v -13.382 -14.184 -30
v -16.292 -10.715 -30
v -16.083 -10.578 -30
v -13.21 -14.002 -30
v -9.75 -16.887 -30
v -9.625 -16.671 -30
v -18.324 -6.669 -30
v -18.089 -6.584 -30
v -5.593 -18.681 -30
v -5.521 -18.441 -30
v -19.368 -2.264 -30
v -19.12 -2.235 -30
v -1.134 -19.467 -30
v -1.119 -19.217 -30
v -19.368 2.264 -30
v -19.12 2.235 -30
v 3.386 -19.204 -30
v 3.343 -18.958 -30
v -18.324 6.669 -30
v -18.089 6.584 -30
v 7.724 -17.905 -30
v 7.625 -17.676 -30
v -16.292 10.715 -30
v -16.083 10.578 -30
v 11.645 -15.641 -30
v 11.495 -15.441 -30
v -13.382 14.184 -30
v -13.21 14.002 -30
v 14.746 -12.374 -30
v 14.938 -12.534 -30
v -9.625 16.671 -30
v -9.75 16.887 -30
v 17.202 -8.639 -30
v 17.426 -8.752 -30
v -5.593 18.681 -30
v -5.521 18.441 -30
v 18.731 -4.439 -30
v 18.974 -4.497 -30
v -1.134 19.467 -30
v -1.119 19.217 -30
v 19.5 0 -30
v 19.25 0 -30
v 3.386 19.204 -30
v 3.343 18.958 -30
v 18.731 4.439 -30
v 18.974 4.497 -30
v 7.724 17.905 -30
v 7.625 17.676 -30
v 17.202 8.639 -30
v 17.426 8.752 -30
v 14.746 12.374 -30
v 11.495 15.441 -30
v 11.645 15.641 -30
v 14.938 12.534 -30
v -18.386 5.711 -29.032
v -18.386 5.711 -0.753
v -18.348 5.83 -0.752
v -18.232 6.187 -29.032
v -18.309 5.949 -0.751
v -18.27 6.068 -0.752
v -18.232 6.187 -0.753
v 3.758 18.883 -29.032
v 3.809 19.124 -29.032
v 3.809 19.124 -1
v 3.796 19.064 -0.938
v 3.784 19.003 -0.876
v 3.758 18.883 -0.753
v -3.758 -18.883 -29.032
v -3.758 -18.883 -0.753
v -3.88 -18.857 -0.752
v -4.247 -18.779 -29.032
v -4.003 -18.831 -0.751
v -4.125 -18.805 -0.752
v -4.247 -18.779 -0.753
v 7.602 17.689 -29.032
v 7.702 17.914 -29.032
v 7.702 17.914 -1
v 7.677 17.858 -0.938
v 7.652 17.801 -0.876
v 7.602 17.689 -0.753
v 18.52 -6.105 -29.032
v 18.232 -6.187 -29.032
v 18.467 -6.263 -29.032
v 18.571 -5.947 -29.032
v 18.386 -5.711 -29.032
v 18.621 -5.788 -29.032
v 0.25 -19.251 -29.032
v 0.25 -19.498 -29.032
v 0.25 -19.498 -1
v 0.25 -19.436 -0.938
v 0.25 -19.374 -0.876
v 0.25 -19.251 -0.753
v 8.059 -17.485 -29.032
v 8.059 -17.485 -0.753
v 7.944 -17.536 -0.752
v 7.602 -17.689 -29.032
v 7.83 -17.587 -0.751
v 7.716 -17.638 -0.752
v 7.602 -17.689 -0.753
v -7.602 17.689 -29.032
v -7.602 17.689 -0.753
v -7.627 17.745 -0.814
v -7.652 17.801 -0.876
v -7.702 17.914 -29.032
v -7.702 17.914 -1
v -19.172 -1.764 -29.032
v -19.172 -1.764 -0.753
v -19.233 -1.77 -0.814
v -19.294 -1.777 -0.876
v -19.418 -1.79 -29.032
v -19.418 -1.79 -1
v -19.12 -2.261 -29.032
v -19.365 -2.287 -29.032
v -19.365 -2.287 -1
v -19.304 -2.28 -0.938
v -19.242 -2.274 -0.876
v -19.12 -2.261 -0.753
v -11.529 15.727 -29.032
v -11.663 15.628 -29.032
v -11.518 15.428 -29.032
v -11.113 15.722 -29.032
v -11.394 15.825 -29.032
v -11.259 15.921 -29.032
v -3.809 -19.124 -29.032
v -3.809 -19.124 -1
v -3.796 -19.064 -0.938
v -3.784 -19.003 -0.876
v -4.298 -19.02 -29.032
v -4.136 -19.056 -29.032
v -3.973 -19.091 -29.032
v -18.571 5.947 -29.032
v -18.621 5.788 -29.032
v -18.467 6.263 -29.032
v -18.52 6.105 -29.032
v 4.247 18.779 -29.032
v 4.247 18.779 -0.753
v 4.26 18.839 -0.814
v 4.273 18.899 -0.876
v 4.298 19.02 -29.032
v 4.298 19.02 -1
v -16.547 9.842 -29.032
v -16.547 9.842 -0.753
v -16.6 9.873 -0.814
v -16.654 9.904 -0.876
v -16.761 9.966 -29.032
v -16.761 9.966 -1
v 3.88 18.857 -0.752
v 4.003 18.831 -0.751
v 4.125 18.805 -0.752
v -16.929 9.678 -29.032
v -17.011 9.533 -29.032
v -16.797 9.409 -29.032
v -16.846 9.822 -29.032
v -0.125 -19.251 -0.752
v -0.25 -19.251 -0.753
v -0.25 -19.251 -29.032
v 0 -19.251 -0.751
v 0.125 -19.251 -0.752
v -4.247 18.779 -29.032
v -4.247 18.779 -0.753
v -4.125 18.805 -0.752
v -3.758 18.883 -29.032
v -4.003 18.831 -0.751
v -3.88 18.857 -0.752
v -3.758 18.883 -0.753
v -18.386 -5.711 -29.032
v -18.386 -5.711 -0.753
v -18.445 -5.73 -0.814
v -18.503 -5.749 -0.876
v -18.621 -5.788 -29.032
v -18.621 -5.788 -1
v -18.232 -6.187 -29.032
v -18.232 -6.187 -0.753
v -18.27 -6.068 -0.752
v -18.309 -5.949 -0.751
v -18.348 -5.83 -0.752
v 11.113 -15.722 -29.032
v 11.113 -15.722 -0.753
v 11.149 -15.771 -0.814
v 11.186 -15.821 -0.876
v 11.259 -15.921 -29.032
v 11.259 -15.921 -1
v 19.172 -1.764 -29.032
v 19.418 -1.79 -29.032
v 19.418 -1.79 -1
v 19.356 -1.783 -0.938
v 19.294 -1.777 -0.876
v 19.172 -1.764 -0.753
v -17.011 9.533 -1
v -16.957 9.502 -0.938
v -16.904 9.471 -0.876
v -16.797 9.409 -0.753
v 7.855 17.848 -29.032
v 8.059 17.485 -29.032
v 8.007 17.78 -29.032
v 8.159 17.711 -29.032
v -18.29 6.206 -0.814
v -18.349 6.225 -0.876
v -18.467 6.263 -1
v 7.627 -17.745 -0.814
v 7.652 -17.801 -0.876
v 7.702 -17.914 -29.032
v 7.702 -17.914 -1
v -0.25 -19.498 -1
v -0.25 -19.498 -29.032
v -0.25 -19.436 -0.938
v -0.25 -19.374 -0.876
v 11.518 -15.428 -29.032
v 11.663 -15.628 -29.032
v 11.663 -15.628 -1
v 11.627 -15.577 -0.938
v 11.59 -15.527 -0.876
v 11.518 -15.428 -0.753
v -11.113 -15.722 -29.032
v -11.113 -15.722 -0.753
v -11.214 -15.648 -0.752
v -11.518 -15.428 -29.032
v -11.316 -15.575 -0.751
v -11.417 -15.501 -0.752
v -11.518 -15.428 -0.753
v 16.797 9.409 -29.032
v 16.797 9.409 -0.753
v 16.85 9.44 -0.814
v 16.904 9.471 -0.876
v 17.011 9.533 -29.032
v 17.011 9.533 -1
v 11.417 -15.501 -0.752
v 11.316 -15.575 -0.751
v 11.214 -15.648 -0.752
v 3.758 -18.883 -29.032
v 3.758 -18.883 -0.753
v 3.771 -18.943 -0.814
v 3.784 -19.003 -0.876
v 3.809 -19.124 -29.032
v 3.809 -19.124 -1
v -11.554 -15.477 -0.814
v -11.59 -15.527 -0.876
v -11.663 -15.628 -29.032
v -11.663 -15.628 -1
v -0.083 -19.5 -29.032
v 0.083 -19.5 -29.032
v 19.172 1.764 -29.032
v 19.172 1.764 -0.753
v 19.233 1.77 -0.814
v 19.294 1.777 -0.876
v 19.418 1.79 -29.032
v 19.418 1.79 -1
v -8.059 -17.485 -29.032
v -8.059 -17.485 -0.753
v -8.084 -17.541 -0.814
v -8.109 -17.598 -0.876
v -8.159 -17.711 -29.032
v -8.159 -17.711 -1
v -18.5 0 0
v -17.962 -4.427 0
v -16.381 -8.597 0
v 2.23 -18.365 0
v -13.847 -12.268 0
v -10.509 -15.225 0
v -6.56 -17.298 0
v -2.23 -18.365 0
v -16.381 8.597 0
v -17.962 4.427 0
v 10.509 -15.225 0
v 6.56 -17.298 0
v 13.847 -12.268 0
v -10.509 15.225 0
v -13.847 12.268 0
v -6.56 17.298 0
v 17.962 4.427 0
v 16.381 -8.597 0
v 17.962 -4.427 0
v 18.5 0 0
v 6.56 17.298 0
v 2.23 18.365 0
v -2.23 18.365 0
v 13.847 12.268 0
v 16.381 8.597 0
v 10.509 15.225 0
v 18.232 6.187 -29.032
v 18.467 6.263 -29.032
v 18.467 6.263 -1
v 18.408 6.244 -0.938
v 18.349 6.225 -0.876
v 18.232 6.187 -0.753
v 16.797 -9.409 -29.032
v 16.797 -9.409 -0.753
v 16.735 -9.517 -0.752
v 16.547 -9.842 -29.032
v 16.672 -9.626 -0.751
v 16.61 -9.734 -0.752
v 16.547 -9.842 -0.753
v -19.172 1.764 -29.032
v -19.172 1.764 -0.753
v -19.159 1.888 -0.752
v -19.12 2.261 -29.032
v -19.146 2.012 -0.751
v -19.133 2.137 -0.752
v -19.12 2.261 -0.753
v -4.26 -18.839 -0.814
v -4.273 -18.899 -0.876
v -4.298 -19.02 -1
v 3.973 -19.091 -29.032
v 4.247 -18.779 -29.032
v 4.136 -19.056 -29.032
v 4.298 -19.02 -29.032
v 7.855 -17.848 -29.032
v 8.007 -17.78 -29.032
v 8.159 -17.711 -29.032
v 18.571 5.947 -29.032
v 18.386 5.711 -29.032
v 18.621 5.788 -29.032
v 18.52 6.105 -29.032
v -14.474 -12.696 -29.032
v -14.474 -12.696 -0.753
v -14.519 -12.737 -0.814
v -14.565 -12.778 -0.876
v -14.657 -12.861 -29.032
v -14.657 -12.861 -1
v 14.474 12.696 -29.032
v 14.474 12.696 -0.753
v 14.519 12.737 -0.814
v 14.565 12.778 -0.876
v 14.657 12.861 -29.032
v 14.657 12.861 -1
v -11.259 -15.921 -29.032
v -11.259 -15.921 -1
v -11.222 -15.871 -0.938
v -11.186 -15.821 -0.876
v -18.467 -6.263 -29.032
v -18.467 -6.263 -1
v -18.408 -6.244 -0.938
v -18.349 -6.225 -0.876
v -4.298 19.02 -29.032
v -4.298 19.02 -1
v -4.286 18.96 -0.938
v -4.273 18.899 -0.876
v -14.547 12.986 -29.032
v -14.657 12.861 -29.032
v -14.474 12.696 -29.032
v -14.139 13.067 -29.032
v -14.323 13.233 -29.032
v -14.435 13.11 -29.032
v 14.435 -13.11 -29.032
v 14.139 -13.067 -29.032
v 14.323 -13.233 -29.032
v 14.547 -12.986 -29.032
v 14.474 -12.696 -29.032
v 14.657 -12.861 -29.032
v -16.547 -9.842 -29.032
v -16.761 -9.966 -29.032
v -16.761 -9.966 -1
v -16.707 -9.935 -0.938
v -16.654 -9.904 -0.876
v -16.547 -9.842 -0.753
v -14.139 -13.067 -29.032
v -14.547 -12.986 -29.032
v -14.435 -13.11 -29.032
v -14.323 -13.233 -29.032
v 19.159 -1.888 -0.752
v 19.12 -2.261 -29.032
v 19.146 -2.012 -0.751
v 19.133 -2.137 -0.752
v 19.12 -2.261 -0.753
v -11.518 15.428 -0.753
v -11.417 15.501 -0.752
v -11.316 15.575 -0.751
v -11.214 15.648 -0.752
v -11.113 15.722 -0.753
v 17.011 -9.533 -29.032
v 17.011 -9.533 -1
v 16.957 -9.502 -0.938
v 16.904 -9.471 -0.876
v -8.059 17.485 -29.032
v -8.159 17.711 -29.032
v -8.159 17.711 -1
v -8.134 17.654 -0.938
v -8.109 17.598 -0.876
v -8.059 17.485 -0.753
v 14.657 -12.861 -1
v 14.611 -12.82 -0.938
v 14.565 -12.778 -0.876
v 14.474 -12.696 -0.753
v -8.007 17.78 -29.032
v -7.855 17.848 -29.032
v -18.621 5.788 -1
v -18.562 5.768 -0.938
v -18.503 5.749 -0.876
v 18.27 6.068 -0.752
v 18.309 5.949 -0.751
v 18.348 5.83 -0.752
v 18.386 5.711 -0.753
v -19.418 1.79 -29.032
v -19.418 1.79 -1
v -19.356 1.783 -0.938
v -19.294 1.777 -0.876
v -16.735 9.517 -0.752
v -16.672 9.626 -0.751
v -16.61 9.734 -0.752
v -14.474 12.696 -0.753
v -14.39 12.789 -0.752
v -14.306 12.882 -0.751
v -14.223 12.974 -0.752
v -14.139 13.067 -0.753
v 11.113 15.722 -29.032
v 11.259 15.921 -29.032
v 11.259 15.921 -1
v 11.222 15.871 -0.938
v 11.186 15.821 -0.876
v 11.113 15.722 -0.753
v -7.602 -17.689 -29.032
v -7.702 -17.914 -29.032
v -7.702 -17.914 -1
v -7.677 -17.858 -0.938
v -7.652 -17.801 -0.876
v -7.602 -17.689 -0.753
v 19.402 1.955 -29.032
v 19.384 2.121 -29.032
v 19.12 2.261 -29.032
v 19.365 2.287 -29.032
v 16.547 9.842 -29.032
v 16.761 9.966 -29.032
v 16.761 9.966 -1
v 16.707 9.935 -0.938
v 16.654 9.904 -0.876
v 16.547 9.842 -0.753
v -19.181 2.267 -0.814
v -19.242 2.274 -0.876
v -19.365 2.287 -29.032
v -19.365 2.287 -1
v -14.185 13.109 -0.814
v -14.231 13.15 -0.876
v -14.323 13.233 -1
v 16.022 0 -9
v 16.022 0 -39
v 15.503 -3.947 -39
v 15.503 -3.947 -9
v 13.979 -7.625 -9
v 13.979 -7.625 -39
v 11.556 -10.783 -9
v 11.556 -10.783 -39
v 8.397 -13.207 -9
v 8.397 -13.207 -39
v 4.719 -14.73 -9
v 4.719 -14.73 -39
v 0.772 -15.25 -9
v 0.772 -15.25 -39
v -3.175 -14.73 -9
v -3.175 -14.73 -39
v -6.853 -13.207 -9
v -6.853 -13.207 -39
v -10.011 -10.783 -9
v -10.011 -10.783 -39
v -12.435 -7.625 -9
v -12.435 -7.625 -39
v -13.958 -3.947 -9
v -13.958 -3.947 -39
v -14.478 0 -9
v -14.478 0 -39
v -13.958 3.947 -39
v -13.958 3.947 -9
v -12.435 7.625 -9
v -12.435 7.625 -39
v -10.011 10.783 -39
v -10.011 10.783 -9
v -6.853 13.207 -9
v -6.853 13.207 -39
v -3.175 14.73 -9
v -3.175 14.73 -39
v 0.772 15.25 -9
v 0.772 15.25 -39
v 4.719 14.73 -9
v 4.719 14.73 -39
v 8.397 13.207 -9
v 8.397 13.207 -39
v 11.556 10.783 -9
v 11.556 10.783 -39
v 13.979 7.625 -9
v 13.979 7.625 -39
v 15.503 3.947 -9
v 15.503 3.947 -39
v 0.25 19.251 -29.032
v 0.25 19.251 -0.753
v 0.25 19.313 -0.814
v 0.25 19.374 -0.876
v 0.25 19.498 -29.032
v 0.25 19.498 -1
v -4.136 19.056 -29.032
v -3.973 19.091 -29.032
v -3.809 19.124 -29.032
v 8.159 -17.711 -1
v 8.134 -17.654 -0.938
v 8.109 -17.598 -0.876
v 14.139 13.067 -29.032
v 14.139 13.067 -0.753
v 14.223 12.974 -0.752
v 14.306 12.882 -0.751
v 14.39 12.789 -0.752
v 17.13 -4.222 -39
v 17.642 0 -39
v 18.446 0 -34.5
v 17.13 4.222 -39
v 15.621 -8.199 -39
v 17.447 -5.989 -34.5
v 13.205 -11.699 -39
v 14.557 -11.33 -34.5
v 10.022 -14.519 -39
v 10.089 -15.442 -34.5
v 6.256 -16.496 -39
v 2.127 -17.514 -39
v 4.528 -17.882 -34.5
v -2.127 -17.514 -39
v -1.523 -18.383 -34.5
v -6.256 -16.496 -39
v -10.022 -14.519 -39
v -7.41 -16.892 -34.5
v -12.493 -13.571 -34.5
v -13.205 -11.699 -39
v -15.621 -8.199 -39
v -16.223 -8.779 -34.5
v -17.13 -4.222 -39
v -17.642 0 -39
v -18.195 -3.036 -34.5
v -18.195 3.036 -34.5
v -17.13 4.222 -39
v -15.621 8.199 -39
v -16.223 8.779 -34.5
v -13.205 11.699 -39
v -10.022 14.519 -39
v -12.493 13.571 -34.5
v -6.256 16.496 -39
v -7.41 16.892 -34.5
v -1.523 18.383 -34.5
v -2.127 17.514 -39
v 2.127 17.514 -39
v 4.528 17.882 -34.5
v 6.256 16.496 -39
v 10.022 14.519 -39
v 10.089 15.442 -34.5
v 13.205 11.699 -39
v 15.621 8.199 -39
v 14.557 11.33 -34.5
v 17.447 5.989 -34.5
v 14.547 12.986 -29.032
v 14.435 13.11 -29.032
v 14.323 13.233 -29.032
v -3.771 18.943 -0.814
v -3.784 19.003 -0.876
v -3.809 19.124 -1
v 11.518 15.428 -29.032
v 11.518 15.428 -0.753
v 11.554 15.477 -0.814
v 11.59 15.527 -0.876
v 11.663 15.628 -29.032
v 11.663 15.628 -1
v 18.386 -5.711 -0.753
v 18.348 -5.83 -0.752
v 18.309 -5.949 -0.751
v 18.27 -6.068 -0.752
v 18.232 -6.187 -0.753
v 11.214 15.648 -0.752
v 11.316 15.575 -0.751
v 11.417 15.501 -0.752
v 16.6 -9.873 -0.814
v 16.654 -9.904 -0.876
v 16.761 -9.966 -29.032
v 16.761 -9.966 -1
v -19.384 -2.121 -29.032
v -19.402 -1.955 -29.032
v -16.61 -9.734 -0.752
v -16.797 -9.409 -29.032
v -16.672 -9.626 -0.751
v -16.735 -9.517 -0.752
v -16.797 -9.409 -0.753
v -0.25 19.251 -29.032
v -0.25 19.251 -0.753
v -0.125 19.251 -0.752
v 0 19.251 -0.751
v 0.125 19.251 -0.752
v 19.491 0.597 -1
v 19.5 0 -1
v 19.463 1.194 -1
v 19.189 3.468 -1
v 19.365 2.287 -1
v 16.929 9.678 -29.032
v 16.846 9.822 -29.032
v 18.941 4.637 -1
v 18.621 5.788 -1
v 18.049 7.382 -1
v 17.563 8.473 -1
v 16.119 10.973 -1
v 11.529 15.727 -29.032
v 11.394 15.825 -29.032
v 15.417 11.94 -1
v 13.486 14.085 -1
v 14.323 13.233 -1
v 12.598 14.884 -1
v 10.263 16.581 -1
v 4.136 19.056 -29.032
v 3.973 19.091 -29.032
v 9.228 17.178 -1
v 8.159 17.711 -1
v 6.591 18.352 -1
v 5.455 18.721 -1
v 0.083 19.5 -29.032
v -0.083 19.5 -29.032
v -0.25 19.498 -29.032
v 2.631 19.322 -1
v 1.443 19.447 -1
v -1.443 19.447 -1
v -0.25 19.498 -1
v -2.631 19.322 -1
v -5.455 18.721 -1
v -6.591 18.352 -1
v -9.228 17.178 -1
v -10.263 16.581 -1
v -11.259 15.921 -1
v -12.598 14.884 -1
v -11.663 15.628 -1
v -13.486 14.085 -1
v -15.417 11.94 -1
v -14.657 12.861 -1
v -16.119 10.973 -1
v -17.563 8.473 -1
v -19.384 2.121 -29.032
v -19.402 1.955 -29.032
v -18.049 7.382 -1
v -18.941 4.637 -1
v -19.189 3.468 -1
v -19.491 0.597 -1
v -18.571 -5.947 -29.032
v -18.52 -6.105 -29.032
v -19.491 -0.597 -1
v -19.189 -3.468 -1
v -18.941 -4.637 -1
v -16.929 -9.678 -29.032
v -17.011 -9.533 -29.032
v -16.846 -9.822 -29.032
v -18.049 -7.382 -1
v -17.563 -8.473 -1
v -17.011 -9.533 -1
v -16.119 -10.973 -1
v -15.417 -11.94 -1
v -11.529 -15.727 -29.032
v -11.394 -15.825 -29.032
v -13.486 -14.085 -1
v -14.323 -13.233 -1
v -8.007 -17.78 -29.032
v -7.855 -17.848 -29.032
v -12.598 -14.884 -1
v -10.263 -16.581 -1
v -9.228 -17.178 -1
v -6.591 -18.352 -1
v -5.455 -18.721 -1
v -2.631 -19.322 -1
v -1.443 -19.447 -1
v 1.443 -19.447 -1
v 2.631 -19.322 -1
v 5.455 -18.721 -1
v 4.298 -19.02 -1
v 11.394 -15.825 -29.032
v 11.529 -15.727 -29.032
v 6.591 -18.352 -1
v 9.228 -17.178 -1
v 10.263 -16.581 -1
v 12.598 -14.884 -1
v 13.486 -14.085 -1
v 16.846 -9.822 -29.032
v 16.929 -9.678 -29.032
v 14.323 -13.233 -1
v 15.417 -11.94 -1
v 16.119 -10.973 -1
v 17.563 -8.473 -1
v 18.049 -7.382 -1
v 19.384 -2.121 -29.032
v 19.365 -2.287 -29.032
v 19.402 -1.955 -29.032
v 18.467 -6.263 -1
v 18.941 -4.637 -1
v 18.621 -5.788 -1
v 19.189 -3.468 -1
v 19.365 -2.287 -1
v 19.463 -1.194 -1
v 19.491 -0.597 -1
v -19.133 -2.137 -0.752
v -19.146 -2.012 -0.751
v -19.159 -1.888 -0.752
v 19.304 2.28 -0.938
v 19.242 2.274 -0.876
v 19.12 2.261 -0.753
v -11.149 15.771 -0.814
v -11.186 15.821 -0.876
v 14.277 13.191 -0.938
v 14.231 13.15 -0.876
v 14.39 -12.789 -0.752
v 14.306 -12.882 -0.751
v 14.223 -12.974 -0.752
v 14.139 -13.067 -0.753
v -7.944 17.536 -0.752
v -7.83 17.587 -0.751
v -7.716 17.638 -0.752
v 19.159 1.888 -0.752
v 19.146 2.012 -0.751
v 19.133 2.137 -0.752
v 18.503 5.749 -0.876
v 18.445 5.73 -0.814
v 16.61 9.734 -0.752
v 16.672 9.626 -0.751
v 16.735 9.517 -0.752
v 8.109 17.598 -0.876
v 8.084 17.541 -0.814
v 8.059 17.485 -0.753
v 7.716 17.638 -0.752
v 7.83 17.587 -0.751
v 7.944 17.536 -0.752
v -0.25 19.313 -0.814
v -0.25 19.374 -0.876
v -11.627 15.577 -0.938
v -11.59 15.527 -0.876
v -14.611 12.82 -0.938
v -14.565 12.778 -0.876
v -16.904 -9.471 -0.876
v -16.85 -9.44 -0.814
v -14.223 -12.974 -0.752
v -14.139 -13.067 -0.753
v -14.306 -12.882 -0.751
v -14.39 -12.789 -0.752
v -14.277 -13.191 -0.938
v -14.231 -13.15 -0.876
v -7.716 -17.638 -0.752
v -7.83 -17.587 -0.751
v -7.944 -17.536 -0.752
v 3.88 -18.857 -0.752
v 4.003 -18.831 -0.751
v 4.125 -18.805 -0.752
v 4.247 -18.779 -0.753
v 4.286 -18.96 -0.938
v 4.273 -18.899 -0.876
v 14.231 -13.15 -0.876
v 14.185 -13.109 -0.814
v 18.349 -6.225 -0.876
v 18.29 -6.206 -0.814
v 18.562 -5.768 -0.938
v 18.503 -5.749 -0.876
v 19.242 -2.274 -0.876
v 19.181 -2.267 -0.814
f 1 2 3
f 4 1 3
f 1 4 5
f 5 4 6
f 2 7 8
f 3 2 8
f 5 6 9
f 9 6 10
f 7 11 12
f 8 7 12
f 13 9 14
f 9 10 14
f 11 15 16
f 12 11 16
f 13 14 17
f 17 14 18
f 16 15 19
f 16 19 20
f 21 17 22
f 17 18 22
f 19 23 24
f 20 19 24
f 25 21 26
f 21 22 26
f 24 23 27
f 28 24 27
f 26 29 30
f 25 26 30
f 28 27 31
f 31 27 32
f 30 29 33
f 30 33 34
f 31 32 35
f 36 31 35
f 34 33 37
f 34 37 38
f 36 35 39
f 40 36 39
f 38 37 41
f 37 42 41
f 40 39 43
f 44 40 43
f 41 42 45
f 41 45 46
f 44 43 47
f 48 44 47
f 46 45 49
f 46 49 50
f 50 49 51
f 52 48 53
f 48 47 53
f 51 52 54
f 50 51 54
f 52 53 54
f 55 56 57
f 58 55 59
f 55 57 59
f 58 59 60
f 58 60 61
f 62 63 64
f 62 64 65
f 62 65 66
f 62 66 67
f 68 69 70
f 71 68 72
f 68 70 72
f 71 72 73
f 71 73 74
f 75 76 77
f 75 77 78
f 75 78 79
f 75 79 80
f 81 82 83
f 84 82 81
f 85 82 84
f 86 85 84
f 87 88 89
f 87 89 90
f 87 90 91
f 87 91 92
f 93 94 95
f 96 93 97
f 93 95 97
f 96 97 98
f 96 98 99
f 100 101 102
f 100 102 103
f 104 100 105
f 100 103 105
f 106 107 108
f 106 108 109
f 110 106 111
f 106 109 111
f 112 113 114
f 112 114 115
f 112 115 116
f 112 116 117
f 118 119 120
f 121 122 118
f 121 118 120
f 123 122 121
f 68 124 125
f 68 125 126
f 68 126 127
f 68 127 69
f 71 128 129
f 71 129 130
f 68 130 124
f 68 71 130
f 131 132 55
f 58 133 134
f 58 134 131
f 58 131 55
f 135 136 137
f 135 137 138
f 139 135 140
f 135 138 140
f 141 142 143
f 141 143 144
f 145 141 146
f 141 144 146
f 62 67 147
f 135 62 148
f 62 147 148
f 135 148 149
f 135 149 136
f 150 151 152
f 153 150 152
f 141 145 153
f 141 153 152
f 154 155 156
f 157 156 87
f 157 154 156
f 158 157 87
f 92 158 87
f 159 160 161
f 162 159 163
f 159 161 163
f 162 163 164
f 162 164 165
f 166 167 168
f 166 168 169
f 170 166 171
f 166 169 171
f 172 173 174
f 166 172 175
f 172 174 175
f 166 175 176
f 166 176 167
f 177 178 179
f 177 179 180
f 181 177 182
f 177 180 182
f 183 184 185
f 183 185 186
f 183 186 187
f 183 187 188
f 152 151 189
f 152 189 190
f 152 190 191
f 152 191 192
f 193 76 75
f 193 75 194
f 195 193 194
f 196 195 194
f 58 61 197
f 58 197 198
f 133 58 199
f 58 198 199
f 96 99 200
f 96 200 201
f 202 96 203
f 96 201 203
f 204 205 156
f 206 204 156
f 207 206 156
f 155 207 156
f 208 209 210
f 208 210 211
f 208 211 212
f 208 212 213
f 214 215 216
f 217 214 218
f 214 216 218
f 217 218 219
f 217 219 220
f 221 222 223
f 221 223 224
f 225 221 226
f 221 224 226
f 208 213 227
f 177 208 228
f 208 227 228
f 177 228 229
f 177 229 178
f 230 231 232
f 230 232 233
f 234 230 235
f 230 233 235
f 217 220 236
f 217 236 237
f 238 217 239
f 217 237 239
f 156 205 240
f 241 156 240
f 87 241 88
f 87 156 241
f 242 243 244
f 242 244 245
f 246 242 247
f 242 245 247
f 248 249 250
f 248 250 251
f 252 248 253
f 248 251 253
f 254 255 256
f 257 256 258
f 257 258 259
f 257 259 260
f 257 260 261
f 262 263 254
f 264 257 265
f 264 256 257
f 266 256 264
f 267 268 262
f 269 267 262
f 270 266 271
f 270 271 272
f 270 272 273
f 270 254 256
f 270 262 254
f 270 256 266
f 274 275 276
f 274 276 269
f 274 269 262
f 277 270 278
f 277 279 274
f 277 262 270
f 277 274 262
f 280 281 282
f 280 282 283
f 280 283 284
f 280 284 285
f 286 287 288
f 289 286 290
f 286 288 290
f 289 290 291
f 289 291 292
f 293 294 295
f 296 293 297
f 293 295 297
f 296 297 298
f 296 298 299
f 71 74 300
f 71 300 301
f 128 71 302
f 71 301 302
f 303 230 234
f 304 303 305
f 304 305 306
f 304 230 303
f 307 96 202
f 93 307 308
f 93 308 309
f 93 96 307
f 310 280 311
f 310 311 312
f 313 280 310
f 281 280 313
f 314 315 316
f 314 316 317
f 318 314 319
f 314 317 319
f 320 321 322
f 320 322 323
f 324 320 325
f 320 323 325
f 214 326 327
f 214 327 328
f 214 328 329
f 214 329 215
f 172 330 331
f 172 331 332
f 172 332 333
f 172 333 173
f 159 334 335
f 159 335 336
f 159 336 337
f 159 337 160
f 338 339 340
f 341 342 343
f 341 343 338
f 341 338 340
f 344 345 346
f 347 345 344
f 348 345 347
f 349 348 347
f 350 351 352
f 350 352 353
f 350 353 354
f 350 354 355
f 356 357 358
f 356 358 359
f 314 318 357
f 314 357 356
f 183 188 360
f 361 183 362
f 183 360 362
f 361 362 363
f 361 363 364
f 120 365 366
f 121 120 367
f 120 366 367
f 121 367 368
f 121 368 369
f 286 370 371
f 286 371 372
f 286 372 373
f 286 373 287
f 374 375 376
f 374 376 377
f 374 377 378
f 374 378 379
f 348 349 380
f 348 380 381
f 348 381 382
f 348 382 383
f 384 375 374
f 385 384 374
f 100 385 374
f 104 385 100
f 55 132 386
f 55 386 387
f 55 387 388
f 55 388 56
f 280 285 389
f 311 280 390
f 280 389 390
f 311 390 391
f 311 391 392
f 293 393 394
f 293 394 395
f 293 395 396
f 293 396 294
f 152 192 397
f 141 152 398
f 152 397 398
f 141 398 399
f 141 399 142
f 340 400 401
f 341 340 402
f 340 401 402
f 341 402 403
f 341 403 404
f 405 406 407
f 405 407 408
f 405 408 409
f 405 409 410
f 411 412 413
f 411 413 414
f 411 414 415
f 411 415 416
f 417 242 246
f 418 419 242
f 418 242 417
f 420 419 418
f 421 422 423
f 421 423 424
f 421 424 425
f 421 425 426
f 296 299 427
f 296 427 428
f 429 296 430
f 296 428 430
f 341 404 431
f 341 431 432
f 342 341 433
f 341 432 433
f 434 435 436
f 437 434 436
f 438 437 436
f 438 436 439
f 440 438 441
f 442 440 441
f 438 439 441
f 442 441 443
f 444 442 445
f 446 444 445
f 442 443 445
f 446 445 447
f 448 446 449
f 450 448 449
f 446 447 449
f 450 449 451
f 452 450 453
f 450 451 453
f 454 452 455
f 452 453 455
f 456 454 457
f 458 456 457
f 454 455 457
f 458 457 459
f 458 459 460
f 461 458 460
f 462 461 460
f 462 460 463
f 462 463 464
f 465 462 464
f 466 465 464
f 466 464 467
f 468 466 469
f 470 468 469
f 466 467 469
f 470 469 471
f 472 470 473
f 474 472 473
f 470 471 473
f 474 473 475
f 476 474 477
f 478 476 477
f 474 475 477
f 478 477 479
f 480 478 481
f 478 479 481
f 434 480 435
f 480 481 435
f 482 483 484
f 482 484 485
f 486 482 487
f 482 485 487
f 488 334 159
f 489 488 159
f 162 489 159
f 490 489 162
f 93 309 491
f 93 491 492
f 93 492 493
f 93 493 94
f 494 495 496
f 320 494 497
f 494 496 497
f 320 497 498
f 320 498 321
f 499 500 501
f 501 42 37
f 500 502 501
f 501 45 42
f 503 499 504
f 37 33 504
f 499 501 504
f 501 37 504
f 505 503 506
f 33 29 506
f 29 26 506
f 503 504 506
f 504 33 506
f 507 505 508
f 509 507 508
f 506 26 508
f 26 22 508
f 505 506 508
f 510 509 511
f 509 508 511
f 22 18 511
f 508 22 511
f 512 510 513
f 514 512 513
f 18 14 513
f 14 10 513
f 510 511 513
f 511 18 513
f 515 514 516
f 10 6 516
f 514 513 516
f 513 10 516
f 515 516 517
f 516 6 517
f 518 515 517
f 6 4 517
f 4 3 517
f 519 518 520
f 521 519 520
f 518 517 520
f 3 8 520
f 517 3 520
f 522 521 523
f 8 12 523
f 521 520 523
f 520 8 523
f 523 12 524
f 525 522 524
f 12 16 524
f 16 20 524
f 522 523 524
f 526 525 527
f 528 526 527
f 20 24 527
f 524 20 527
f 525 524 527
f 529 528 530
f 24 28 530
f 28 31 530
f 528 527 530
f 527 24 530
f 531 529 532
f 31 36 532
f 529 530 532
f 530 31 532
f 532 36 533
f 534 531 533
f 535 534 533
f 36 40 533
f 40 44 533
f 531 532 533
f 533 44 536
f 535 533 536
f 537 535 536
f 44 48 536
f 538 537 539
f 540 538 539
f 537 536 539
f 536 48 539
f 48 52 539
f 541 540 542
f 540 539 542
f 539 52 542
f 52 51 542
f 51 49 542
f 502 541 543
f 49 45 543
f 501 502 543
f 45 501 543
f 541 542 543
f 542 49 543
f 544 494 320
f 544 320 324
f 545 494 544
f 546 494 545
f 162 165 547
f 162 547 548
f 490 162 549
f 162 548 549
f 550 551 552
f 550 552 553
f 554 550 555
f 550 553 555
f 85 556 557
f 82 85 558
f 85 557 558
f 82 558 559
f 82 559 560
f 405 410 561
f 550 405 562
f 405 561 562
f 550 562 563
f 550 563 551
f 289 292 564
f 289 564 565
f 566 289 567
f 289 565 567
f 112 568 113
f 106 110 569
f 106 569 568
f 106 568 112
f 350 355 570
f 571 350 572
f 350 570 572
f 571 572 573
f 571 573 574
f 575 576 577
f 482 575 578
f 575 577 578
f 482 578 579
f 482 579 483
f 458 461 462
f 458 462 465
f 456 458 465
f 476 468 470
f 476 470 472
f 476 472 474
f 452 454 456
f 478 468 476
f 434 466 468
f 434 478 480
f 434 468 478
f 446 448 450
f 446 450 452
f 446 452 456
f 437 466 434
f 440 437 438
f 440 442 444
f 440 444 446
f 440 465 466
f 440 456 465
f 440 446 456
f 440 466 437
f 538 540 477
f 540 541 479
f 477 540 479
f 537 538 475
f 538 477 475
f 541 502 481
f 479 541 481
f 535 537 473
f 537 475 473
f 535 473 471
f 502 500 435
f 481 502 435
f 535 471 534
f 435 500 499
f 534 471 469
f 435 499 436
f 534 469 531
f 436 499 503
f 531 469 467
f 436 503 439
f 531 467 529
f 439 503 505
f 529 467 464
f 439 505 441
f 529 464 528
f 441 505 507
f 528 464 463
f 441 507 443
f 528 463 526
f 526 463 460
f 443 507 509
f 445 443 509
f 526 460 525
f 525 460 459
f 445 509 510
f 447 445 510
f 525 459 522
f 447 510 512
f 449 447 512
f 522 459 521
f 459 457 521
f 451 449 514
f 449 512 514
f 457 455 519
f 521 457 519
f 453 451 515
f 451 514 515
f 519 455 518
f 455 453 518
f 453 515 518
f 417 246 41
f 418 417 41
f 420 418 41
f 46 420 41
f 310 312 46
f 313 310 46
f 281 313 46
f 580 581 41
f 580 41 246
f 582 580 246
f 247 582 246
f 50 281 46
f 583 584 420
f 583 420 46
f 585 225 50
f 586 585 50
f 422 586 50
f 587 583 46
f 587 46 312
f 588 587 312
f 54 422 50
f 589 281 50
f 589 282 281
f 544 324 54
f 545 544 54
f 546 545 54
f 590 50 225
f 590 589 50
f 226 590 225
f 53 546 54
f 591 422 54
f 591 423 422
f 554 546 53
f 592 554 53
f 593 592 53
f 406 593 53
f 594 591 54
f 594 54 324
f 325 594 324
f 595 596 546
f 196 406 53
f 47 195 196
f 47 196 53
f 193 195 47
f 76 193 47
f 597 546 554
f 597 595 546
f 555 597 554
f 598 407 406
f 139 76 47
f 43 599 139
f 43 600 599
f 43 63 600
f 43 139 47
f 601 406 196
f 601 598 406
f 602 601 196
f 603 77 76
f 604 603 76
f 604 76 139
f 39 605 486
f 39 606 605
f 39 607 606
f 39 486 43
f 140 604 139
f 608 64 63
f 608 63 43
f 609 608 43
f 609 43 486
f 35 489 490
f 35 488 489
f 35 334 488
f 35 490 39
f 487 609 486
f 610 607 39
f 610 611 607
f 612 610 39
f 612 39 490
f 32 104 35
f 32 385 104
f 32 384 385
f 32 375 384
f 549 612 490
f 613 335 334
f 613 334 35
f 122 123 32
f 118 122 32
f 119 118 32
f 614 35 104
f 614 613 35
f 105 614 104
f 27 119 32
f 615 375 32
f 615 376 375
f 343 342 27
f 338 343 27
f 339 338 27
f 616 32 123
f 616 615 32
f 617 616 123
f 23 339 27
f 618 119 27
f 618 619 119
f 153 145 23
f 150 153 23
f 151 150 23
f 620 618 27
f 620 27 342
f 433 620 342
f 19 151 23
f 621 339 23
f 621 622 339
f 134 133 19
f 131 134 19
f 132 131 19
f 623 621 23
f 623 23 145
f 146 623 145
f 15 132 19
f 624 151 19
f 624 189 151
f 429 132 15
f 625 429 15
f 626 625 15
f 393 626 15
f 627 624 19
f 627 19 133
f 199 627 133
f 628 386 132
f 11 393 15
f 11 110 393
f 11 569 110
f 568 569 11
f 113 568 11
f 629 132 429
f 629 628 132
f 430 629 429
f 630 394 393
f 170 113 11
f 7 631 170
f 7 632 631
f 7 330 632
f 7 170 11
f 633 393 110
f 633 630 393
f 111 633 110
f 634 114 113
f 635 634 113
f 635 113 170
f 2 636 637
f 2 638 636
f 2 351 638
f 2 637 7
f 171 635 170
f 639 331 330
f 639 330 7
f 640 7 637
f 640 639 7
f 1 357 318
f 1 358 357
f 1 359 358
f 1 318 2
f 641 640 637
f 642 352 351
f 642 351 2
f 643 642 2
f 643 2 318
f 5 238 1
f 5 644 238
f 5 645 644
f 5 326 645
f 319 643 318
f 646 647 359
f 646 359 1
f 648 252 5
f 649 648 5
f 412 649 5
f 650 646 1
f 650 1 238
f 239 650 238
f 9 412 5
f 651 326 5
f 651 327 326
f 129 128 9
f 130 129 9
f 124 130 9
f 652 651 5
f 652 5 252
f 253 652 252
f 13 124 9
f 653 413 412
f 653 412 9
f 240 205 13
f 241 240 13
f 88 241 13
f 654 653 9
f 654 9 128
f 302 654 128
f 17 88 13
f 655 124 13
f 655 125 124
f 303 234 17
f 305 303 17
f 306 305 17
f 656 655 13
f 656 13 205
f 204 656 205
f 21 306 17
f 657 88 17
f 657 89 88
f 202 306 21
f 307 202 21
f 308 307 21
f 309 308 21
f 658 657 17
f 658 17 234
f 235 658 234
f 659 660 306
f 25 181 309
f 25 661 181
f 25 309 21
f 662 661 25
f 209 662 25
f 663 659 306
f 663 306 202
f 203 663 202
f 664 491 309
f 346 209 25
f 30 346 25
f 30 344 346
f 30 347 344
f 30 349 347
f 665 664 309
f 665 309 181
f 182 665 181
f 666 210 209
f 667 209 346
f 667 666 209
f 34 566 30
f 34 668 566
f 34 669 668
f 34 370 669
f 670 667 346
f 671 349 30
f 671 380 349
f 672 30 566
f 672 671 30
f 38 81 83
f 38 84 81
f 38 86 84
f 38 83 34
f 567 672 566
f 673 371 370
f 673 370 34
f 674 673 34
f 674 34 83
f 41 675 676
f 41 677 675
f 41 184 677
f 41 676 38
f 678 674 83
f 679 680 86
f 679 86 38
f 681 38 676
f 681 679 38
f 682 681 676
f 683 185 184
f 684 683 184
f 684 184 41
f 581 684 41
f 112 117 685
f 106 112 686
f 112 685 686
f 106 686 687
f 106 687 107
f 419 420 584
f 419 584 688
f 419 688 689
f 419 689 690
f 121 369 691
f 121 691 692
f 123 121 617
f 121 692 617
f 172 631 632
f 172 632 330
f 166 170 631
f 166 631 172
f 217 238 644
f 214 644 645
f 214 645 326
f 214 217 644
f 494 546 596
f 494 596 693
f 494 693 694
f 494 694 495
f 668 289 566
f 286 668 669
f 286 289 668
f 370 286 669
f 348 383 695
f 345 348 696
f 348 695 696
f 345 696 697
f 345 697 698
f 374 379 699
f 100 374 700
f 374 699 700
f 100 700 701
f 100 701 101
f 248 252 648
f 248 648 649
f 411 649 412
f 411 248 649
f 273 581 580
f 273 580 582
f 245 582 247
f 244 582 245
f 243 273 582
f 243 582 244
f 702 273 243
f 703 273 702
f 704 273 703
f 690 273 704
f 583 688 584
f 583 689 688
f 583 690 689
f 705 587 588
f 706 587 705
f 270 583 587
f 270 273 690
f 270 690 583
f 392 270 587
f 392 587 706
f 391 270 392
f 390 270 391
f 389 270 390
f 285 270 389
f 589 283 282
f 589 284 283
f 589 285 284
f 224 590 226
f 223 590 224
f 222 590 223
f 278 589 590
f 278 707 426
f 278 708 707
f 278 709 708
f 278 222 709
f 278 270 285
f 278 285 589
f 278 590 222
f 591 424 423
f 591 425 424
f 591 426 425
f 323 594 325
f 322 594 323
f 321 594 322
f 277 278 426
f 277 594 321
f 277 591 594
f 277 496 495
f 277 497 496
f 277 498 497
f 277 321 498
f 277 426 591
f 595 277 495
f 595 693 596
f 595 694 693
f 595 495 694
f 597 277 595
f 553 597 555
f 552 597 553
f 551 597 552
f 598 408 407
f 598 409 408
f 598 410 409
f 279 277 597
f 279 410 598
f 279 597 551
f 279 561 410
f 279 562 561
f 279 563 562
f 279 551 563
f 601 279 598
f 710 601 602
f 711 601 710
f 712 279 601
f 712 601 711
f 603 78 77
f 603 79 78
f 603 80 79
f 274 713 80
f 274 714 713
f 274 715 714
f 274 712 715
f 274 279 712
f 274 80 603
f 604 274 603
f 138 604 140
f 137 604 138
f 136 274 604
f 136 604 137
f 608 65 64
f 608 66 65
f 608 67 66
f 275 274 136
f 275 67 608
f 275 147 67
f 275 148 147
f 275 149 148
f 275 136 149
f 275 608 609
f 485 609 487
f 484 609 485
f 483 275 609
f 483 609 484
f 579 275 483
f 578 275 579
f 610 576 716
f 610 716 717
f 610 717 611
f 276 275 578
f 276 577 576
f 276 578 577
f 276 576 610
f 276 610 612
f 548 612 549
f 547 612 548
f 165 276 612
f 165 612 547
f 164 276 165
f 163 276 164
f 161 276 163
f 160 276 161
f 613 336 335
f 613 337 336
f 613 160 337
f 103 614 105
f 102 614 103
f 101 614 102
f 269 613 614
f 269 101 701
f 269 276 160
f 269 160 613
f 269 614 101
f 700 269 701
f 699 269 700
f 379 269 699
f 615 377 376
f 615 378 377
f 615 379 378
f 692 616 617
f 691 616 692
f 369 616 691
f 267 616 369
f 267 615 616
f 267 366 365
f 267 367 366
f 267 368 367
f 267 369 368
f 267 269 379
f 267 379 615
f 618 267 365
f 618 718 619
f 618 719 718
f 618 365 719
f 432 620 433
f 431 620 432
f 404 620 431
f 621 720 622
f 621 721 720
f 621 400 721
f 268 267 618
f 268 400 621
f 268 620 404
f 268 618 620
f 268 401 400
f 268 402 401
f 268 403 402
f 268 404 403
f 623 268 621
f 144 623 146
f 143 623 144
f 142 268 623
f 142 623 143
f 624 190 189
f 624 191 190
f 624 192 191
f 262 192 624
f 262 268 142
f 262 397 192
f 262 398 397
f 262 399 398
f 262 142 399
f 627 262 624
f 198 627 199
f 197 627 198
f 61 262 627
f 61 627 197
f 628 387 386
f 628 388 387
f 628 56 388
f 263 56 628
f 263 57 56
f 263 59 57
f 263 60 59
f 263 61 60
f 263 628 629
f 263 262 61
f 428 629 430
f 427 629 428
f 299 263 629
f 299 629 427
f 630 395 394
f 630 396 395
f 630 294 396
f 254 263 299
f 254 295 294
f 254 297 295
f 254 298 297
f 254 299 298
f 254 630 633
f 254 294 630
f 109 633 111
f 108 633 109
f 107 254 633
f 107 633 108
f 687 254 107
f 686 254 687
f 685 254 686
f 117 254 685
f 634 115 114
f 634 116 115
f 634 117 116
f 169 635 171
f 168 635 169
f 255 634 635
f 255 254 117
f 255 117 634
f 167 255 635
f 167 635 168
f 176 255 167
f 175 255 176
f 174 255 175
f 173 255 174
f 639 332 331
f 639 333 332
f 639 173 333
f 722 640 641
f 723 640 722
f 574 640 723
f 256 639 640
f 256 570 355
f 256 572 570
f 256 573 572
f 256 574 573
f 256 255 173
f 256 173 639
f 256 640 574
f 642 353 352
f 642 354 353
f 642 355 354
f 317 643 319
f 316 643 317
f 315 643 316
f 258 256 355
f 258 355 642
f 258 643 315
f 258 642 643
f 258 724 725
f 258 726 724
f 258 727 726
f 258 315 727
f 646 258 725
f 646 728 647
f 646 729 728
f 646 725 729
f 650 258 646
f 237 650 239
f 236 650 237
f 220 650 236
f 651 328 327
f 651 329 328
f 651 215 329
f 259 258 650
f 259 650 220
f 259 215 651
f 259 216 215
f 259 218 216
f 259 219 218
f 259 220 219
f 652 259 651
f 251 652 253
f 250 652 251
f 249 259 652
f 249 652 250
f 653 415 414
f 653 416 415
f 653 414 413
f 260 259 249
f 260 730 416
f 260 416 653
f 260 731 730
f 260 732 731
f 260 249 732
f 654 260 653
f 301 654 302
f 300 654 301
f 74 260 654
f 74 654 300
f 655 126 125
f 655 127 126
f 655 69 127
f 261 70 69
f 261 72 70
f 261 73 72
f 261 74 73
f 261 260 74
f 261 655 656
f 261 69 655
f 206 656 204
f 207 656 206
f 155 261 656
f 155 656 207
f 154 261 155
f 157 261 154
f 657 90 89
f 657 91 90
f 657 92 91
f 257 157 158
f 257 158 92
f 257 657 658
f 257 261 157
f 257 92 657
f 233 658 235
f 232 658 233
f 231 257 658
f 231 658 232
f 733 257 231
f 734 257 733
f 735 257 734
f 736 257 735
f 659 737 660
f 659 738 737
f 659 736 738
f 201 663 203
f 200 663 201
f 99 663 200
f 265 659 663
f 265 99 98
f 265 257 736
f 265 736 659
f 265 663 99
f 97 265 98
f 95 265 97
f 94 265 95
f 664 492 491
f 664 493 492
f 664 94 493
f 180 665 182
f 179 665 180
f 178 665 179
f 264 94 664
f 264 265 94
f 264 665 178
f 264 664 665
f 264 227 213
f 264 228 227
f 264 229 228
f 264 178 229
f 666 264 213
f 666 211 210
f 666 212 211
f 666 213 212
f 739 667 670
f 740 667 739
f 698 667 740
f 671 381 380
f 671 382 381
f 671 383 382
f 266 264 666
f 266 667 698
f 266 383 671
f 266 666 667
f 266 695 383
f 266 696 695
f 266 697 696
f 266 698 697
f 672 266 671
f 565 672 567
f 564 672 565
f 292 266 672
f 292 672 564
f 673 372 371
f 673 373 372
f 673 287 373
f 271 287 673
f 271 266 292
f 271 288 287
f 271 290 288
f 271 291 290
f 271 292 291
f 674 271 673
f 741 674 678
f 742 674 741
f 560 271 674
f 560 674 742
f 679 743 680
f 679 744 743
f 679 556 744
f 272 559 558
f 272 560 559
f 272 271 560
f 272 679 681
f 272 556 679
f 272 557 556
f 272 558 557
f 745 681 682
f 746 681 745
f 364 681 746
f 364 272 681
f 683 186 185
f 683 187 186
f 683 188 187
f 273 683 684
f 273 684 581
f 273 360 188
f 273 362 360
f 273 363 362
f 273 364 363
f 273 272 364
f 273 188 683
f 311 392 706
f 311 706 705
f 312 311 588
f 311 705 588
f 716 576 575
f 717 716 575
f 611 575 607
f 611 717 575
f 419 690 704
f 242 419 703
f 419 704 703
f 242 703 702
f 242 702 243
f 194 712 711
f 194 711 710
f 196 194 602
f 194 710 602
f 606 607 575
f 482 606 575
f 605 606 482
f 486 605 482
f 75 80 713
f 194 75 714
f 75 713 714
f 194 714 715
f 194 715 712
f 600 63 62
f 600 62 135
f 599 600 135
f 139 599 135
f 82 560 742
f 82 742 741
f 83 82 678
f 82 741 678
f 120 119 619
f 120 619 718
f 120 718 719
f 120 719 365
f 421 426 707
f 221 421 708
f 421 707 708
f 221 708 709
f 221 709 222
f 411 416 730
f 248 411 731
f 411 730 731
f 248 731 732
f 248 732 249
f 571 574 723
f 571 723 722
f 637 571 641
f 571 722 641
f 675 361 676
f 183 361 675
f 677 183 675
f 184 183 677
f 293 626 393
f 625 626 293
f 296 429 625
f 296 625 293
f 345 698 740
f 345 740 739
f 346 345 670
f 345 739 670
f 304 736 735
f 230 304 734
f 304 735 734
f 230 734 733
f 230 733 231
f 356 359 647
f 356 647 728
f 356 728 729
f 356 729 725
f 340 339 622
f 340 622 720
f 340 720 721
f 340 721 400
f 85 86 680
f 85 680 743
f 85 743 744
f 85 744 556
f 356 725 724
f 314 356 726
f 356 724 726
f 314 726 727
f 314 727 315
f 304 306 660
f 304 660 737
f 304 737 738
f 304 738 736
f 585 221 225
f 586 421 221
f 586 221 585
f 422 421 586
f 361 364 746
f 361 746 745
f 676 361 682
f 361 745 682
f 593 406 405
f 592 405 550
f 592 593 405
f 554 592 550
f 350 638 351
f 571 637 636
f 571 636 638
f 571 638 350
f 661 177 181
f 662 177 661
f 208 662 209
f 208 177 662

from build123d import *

# Parameters (mm, degrees)
F0_R     = 19.5
F1_DEPTH = 30
F2_SIZE  = 1
F5_R     = 15.25
F6_DEPTH = 30
F7_W     = 0.5
F7_H     = 0.5
F8_DEPTH = 29.032


with BuildPart() as f1:
    # F0 (on Top) → F1 (new body)
    with BuildSketch(Plane.XY):
        Circle(F0_R)
    extrude(amount=-F1_DEPTH)

    # F2
    f2_edges = [f1.edges().sort_by_distance(p)[0] for p in [
        (-19.5, 0, 0),
    ]]
    chamfer(f2_edges, length=F2_SIZE)

    # F3 (on Front) → F4 (revolve)
    with BuildSketch(Plane.XZ):
        Polygon((19.25, -30), (0, -30), (0, -39), (17.6423, -39), align=None)
    revolve(axis=Axis((0, 0, -34.5), (0, 0, -1)))

    # F5 (on face) → F6 (cut)
    with BuildSketch(Plane(origin=(0, 0, -39), x_dir=(1, 0, 0), z_dir=(0, 0, -1))):
        with Locations((0.772339, 0)):
            Circle(F5_R)
    extrude(amount=-F6_DEPTH, mode=Mode.SUBTRACT)

    # F7 (on face) → F8 (cut)
    with BuildSketch(Plane.XY):
        with Locations((0, 19.501211)):
            Rectangle(F7_W, F7_H)
        Polygon((-4.351045, 19.267622), (-4.247089, 18.778548), (-3.758015, 18.882504), (-3.861971, 19.371578), align=None)
        Polygon((-8.261928, 17.941945), (-8.058559, 17.485172), (-7.601787, 17.688541), (-7.805155, 18.145313), align=None)
        Polygon((-11.811725, 15.832119), (-11.517832, 15.427611), (-11.113324, 15.721503), (-11.407216, 16.126012), align=None)
        Polygon((-14.845293, 13.030354), (-14.473721, 12.695788), (-14.139155, 13.067361), (-14.510728, 13.401926), align=None)
        Polygon((-17.230051, 9.659099), (-16.797038, 9.409099), (-16.547038, 9.842112), (-16.980051, 10.092112), align=None)
        Polygon((-18.861772, 5.865696), (-18.386244, 5.711187), (-18.231736, 6.186716), (-18.707264, 6.341224), align=None)
        Polygon((-19.669144, 1.815933), (-19.171883, 1.763669), (-19.119619, 2.26093), (-19.61688, 2.313194), align=None)
        Polygon((-19.61688, -2.313194), (-19.119619, -2.26093), (-19.171883, -1.763669), (-19.669144, -1.815933), align=None)
        Polygon((-18.707264, -6.341224), (-18.231736, -6.186716), (-18.386244, -5.711187), (-18.861772, -5.865696), align=None)
        Polygon((-16.980051, -10.092112), (-16.547038, -9.842112), (-16.797038, -9.409099), (-17.230051, -9.659099), align=None)
        Polygon((-14.510728, -13.401926), (-14.139155, -13.067361), (-14.473721, -12.695788), (-14.845293, -13.030354), align=None)
        Polygon((-11.407216, -16.126012), (-11.113324, -15.721503), (-11.517832, -15.427611), (-11.811725, -15.832119), align=None)
        Polygon((-7.805155, -18.145313), (-7.601787, -17.688541), (-8.058559, -17.485172), (-8.261928, -17.941945), align=None)
        Polygon((-3.861971, -19.371578), (-3.758015, -18.882504), (-4.247089, -18.778548), (-4.351045, -19.267622), align=None)
        with Locations((0, -19.501211)):
            Rectangle(F7_W, F7_H)
        Polygon((4.351045, -19.267622), (4.247089, -18.778548), (3.758015, -18.882504), (3.861971, -19.371578), align=None)
        Polygon((8.261928, -17.941945), (8.058559, -17.485172), (7.601787, -17.688541), (7.805155, -18.145313), align=None)
        Polygon((11.811725, -15.832119), (11.517832, -15.427611), (11.113324, -15.721503), (11.407216, -16.126012), align=None)
        Polygon((14.845293, -13.030354), (14.473721, -12.695788), (14.139155, -13.067361), (14.510728, -13.401926), align=None)
        Polygon((17.230051, -9.659099), (16.797038, -9.409099), (16.547038, -9.842112), (16.980051, -10.092112), align=None)
        Polygon((18.861772, -5.865696), (18.386244, -5.711187), (18.231736, -6.186716), (18.707264, -6.341224), align=None)
        Polygon((19.669144, -1.815933), (19.171883, -1.763669), (19.119619, -2.26093), (19.61688, -2.313194), align=None)
        Polygon((19.61688, 2.313194), (19.119619, 2.26093), (19.171883, 1.763669), (19.669144, 1.815933), align=None)
        Polygon((18.707264, 6.341224), (18.231736, 6.186716), (18.386244, 5.711187), (18.861772, 5.865696), align=None)
        Polygon((16.980051, 10.092112), (16.547038, 9.842112), (16.797038, 9.409099), (17.230051, 9.659099), align=None)
        Polygon((14.510728, 13.401926), (14.139155, 13.067361), (14.473721, 12.695788), (14.845293, 13.030354), align=None)
        Polygon((11.407216, 16.126012), (11.113324, 15.721503), (11.517832, 15.427611), (11.811725, 15.832119), align=None)
        Polygon((7.805155, 18.145313), (7.601787, 17.688541), (8.058559, 17.485172), (8.261928, 17.941945), align=None)
        Polygon((3.861971, 19.371578), (3.758015, 18.882504), (4.247089, 18.778548), (4.351045, 19.267622), align=None)
    extrude(amount=-F8_DEPTH, mode=Mode.SUBTRACT)


solid = f1.part
